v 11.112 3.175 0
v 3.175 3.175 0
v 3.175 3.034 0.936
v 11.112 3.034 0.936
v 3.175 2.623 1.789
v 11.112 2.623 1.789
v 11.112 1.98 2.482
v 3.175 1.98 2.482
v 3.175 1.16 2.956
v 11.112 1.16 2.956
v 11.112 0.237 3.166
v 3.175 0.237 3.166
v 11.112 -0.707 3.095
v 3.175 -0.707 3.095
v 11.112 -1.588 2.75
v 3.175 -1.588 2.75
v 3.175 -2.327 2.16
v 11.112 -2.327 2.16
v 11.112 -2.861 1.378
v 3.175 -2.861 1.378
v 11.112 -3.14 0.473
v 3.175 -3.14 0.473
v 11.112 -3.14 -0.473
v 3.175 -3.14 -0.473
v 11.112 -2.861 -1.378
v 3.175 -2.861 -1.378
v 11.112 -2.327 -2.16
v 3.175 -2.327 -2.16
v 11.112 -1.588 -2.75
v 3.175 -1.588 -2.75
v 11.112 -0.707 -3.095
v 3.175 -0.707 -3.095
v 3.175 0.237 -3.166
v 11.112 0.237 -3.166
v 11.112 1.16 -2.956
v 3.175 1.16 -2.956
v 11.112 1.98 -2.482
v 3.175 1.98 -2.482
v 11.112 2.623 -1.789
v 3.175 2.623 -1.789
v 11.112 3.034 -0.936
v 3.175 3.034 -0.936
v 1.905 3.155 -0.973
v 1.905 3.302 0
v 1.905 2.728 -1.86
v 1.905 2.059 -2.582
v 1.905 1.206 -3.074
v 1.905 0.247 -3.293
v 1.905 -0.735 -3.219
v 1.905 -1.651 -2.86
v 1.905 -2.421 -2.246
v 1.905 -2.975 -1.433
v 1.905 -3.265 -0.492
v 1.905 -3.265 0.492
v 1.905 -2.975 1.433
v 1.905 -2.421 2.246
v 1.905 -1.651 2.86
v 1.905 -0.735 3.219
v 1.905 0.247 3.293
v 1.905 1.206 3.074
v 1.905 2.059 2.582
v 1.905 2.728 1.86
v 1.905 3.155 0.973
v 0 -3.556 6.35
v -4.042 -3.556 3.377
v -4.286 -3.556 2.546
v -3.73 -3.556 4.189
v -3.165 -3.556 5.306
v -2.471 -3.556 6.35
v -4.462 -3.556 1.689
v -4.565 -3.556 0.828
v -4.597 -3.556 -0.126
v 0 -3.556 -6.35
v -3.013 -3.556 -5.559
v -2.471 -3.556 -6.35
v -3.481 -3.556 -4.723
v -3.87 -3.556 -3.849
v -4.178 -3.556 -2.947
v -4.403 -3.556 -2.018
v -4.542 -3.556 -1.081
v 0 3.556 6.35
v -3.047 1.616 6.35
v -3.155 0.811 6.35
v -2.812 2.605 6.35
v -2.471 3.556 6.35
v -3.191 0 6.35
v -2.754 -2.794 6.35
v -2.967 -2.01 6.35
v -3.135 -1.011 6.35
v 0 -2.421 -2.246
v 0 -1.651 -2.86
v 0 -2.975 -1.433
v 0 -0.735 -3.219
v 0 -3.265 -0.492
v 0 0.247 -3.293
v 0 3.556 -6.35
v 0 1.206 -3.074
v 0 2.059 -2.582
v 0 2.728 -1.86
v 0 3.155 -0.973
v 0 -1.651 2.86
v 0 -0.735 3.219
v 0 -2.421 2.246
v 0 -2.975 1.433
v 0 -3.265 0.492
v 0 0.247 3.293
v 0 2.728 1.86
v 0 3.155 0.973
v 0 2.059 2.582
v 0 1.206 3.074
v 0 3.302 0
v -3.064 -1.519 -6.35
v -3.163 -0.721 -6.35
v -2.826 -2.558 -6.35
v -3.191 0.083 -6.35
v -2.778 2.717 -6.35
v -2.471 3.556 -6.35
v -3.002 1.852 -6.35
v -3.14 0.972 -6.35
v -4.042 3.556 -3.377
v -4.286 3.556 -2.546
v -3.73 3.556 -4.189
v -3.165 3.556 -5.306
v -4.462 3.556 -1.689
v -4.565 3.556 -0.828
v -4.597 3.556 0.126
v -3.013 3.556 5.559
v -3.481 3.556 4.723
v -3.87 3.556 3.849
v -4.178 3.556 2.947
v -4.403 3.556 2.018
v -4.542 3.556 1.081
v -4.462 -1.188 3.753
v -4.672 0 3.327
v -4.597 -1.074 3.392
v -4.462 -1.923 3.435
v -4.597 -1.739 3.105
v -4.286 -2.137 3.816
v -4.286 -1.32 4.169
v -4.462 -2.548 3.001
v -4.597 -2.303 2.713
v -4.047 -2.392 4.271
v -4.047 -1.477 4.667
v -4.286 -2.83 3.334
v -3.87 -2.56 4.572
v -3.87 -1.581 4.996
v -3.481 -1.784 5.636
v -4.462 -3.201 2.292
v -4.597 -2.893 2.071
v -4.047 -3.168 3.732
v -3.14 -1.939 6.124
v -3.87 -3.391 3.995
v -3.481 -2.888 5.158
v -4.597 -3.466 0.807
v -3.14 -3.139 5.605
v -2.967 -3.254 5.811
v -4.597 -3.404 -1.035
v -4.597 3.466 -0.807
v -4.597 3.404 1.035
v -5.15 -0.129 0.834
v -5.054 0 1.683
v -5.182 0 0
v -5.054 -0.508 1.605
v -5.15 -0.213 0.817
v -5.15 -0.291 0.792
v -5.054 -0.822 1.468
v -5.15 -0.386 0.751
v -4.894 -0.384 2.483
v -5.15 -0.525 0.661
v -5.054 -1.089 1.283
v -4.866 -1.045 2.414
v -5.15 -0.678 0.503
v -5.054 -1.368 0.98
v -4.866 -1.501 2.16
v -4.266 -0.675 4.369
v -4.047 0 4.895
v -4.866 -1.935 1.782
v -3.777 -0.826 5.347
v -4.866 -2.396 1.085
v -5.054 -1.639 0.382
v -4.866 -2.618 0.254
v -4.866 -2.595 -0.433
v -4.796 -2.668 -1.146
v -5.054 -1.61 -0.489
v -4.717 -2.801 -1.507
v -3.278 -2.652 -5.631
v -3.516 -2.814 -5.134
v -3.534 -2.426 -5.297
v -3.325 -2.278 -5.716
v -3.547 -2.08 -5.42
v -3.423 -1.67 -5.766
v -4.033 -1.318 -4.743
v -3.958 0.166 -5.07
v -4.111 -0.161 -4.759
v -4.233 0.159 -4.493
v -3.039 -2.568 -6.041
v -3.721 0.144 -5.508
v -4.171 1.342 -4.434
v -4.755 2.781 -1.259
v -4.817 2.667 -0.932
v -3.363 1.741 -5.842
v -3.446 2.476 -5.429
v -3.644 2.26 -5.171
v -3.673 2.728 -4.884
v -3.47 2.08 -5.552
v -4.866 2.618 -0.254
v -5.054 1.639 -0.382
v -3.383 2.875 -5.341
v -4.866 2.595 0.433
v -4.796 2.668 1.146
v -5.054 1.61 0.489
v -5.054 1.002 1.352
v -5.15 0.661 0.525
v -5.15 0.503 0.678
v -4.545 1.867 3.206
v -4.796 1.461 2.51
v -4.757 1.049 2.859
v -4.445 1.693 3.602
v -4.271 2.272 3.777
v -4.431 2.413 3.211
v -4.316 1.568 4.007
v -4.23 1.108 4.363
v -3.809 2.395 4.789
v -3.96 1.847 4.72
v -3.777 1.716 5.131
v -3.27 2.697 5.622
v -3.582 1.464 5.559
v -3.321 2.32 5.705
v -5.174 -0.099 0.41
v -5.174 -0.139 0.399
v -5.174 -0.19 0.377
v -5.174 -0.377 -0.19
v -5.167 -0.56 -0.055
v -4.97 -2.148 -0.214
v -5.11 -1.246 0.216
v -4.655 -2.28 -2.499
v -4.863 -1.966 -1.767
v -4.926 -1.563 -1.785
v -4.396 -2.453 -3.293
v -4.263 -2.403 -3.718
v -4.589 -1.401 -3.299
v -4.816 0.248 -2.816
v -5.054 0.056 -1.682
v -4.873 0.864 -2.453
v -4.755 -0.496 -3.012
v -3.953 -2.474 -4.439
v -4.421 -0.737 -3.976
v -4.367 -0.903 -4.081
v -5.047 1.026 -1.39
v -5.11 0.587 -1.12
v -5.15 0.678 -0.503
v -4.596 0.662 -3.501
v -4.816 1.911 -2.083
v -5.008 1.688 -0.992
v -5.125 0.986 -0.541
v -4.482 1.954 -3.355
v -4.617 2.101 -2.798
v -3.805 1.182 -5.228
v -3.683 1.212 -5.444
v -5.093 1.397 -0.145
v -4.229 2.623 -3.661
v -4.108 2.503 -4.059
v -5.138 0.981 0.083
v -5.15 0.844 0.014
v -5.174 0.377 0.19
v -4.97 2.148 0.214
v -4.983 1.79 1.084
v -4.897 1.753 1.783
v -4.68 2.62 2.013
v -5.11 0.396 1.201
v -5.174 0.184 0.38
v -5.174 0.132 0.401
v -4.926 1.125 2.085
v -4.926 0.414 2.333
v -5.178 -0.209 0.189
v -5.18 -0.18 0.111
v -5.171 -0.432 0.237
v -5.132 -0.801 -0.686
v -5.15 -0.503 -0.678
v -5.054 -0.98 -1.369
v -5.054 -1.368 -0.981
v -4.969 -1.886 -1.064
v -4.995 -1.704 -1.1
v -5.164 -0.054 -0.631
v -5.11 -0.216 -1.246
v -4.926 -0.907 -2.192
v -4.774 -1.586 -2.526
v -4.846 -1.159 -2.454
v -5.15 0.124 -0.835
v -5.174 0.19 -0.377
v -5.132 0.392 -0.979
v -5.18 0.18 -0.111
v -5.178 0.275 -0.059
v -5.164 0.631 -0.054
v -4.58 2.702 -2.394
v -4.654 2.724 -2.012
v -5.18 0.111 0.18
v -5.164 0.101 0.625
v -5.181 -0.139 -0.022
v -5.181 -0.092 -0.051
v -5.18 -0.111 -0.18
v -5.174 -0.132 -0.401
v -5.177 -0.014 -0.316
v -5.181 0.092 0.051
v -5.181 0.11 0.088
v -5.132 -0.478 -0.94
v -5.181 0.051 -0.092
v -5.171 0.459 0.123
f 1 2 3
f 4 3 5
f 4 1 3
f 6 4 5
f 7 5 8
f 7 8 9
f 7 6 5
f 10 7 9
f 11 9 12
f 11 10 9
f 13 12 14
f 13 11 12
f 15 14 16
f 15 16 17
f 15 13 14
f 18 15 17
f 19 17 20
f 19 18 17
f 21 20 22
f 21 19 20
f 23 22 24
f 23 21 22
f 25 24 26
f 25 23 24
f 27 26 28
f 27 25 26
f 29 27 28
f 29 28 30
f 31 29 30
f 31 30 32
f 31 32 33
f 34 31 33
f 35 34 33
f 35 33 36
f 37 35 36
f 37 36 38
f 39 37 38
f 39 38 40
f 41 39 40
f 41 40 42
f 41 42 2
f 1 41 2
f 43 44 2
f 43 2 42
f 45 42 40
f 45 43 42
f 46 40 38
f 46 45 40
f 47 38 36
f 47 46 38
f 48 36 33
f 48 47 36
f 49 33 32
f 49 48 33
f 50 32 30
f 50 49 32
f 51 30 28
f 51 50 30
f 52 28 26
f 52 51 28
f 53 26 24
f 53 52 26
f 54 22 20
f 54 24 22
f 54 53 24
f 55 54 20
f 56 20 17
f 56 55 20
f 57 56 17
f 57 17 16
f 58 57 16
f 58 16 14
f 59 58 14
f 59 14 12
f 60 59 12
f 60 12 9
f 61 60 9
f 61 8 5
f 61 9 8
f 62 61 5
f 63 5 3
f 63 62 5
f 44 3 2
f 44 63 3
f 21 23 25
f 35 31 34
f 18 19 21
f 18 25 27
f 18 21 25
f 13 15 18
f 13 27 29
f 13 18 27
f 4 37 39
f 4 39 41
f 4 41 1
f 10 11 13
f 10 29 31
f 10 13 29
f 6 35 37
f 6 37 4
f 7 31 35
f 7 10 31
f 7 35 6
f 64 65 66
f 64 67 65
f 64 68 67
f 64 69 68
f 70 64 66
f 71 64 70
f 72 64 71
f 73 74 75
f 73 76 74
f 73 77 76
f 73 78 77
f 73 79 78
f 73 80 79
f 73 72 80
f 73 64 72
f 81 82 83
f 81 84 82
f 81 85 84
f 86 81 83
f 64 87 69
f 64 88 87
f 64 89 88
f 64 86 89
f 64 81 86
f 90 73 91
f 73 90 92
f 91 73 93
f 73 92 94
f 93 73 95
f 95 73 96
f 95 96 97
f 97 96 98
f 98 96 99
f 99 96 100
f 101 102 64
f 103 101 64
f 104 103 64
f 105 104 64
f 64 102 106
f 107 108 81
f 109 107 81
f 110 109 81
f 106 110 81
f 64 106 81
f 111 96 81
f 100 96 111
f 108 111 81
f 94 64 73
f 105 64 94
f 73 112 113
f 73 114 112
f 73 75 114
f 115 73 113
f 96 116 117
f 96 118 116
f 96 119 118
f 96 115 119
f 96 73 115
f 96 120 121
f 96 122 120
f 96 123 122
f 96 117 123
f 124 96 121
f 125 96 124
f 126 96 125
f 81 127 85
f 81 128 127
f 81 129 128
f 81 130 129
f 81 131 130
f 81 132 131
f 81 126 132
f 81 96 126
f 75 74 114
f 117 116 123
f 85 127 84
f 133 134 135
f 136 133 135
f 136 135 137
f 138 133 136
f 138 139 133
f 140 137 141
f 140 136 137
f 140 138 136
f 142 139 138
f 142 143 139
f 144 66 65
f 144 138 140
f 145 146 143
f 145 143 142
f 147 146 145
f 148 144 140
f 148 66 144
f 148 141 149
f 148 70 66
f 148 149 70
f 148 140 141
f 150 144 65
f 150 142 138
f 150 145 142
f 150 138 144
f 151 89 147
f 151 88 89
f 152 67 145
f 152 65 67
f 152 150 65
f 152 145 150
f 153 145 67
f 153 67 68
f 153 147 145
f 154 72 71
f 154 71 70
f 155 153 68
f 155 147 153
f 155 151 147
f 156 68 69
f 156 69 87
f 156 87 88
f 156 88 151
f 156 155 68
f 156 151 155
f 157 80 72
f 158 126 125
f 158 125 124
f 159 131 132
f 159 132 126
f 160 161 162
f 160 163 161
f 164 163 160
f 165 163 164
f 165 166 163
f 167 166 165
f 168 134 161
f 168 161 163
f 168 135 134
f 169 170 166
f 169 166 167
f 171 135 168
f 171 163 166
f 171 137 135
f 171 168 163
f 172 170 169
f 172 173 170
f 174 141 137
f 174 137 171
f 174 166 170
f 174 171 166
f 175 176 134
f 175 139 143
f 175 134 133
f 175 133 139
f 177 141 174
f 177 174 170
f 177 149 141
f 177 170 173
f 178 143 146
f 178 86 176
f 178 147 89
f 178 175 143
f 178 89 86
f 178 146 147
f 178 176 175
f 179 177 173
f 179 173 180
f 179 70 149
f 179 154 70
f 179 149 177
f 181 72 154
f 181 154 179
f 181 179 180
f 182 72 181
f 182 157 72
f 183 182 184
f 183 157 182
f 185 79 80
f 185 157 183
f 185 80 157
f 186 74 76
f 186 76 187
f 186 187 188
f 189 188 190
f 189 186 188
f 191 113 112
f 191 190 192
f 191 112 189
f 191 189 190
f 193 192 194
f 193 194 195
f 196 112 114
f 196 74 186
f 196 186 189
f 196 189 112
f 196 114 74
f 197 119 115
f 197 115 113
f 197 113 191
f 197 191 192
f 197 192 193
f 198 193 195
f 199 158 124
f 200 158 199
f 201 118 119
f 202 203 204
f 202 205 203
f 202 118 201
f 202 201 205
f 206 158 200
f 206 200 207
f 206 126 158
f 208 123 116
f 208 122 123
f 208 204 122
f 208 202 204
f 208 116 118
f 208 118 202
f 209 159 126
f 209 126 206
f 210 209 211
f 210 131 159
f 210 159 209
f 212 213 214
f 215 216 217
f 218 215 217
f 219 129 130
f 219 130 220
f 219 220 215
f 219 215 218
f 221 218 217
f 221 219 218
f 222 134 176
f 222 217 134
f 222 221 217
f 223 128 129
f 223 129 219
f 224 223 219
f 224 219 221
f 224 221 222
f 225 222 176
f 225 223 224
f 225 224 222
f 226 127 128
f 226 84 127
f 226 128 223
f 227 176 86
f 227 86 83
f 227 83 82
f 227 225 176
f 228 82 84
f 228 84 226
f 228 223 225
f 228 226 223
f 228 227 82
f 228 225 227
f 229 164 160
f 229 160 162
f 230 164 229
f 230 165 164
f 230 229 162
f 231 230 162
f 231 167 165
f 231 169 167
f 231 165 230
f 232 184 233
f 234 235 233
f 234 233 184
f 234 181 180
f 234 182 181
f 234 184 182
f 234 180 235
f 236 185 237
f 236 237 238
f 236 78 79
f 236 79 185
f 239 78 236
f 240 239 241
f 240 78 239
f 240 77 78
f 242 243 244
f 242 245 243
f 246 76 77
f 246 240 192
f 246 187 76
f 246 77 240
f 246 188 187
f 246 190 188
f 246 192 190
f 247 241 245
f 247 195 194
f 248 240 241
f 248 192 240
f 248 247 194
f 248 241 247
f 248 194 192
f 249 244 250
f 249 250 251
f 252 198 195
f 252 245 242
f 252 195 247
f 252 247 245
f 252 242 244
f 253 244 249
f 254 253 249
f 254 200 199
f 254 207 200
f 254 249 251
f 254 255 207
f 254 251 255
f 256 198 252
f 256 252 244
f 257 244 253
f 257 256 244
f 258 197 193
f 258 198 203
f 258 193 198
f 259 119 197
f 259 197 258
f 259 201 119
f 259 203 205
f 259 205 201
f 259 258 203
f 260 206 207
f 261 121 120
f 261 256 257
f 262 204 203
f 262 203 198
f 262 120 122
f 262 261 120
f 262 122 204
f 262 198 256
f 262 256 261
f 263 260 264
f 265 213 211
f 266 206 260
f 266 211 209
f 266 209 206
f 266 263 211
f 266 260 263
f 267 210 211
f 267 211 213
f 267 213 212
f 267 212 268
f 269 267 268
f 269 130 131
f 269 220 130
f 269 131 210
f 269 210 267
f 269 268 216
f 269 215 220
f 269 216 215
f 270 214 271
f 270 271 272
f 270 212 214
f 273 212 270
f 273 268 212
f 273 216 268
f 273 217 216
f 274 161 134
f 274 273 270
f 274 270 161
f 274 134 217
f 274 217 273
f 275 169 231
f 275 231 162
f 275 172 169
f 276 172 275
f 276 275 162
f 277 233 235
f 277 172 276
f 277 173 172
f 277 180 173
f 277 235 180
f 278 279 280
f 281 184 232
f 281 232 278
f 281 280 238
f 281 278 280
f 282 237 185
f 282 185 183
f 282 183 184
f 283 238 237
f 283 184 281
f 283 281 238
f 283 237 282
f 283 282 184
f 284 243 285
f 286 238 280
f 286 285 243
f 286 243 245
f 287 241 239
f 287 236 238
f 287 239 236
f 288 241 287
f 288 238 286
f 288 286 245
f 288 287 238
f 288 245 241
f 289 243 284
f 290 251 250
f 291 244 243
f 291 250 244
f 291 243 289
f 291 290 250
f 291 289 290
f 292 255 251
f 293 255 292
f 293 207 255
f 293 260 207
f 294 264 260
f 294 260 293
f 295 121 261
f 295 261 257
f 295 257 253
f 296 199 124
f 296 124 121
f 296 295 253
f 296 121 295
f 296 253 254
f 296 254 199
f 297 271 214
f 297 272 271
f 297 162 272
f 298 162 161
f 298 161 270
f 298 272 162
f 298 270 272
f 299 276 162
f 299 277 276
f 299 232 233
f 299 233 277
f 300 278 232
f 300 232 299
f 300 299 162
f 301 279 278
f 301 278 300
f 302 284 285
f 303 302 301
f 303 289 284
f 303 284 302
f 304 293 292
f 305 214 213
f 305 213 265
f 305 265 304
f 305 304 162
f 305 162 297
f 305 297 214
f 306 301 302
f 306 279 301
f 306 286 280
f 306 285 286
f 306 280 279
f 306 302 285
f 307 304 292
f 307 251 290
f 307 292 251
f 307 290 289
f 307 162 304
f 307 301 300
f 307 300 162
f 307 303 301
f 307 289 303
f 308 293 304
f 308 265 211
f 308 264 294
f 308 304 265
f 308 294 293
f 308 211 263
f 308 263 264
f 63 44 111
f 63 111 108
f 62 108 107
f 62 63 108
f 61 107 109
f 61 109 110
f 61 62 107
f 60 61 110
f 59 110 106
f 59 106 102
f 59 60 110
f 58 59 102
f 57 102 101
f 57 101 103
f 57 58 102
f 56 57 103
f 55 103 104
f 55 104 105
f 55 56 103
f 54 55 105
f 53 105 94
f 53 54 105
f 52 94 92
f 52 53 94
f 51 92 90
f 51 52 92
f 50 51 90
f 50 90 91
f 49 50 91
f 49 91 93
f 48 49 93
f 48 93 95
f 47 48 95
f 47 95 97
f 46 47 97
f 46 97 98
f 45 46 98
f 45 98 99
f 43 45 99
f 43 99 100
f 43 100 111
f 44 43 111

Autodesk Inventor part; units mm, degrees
ref_plane "YZ Plane" through (0, 0, 0) normal (1, 0, 0) x (0, 1, 0)
sketch "Boceto1" plane through (0, 0, 0) normal (0, 0, 1) x (1, 0, 0)
  line L0 (0, 3.302) -> (1.905, 3.302)
  line L1 (1.905, 3.302) -> (3.175, 3.175)
  line L2 (3.175, 3.175) -> (11.1125, 3.175)
  line L3 (11.1125, 3.175) -> (11.1125, 2.4879)
  line L4 (11.1125, 2.4879) -> (11.1125, 0)
  line L5 (0, 3.9624) -> (0, -0.6604) projected
  line L6 (0, 3.302) -> (0, 0)
  line L7 (-0.4343, 0) -> (7.5114, 0)
  line L8 (-2.7437, 0) -> (13.4219, 0) projected
  line L9 (0, 0) -> (11.1125, 0)
  dimension "d0" = 0
  dimension "d1" = 7.9375
  dimension "d2" = 1.27
  dimension "d3" = 4.9759
  dimension "d4" = 6.35
  dimension "d5" = 6.604
  dimension "d6" = 11.1125
revolve "Cuerpo" add sketch "Boceto1" angle 360 about axis through (-0.4343, 0, 0) along (1, 0, 0)
sketch "Boceto2" plane through (0, 0, 0) normal (-1, 0, 0) x (0, 0, 1)
  line L0 (-6.35, 3.556) -> (6.35, 3.556)
  line L1 (6.35, 3.556) -> (6.35, -3.556)
  line L2 (6.35, -3.556) -> (-6.35, -3.556)
  line L3 (-6.35, -3.556) -> (-6.35, 3.556)
  line L4 (-8.89, 0) -> (8.89, 0) projected
  line L5 (0, 4.9784) -> (0, -4.9784) projected
  dimension "d7" = 3.556
  dimension "d8" = 7.112
  dimension "d9" = 6.35
  dimension "d10" = 12.7
extrude "Cabeza" add sketch "Boceto2" along normal blind 5.1816
ref_plane "IDS_WORKPLANE{1}" through (0, 0, 0) normal (0, 1, 0) x (-1, 0, 0)
sketch "Boceto3" plane through (0, 0, 0) normal (0, 1, 0) x (-1, 0, 0)
  arc A0 (5.1816, 0) -> (-0.1952, 9.525) centre (-5.9436, 0) ccw
  line L0 (0, -9.6663) -> (0, 13.5477) projected
  line L1 (8.9083, 0) -> (-8.4189, 0) projected
  line L2 (5.1816, 6.35) -> (5.1816, 9.525)
  line L3 (5.1816, 9.525) -> (-0.1952, 9.525)
  line L4 (5.1816, 6.35) -> (5.1816, -6.35) projected
  dimension "d15" = 11.1252
  dimension "d19" = 19.05
revolve "Empalme1" cut sketch "Boceto3" angle 360 about axis through (-10, 0, 0) along (1, 0, 0) contours A0 L0 L3 L2 L4 | A0 L3 L0
thread "Rosca" size "1/4-20 UNC" class "2A" standard "ANSI Unified Screw Threads" full length
ref_plane "Work Plane3" through (7.1437, 0, 0) normal (0, 0, -1) x (1, 0, 0)
equation "\"d7\" = 0.5 * KBR"
equation "\"d8\" = KBR"
equation "\"d9\" = 0.5 * KOL"
equation "\"d10\" = KOL"
equation "\"d11\" = KOH"
equation "\"d15\" = KR"
equation "\"d19\" = 1.5 * KOL"
equation "\"d1\" = GEL"
equation "\"d2\" = GAL"
equation "\"d3\" = SPD"
equation "\"d4\" = GD"
equation "\"d5\" = BDM"
equation "\"d6\" = NLG"
equation "\"GD\" = NND"
equation "\"NLG\" = 11.1125"
equation "\"GAL\" = 1.27"
equation "\"GEL\" = 7.9375"
equation "\"BDM\" = 6.604"
equation "\"KOL\" = 12.7"
equation "\"KBR\" = 7.112"
equation "\"KOH\" = 5.1816"
equation "\"KR\" = 11.1252"
equation "\"SPD\" = GD1"
equation "\"RR\" = -0.5 * BDM + 0.5 * KBR"
equation "\"d13\" = 0.5 * KOL"
equation "\"GUL\" = 0"
equation "\"PHH\" = 0.15 * KOH"
equation "\"THREADDIA\" = 6.35"
equation "\"TOA\" = 30deg"
equation "\"NND\" = 6.35"
equation "\"GD1\" = 4.97586"
properties part number "ANSI/ASME B18.5 - 1/4 - 20 - 7/16" material "Acero, suave"
